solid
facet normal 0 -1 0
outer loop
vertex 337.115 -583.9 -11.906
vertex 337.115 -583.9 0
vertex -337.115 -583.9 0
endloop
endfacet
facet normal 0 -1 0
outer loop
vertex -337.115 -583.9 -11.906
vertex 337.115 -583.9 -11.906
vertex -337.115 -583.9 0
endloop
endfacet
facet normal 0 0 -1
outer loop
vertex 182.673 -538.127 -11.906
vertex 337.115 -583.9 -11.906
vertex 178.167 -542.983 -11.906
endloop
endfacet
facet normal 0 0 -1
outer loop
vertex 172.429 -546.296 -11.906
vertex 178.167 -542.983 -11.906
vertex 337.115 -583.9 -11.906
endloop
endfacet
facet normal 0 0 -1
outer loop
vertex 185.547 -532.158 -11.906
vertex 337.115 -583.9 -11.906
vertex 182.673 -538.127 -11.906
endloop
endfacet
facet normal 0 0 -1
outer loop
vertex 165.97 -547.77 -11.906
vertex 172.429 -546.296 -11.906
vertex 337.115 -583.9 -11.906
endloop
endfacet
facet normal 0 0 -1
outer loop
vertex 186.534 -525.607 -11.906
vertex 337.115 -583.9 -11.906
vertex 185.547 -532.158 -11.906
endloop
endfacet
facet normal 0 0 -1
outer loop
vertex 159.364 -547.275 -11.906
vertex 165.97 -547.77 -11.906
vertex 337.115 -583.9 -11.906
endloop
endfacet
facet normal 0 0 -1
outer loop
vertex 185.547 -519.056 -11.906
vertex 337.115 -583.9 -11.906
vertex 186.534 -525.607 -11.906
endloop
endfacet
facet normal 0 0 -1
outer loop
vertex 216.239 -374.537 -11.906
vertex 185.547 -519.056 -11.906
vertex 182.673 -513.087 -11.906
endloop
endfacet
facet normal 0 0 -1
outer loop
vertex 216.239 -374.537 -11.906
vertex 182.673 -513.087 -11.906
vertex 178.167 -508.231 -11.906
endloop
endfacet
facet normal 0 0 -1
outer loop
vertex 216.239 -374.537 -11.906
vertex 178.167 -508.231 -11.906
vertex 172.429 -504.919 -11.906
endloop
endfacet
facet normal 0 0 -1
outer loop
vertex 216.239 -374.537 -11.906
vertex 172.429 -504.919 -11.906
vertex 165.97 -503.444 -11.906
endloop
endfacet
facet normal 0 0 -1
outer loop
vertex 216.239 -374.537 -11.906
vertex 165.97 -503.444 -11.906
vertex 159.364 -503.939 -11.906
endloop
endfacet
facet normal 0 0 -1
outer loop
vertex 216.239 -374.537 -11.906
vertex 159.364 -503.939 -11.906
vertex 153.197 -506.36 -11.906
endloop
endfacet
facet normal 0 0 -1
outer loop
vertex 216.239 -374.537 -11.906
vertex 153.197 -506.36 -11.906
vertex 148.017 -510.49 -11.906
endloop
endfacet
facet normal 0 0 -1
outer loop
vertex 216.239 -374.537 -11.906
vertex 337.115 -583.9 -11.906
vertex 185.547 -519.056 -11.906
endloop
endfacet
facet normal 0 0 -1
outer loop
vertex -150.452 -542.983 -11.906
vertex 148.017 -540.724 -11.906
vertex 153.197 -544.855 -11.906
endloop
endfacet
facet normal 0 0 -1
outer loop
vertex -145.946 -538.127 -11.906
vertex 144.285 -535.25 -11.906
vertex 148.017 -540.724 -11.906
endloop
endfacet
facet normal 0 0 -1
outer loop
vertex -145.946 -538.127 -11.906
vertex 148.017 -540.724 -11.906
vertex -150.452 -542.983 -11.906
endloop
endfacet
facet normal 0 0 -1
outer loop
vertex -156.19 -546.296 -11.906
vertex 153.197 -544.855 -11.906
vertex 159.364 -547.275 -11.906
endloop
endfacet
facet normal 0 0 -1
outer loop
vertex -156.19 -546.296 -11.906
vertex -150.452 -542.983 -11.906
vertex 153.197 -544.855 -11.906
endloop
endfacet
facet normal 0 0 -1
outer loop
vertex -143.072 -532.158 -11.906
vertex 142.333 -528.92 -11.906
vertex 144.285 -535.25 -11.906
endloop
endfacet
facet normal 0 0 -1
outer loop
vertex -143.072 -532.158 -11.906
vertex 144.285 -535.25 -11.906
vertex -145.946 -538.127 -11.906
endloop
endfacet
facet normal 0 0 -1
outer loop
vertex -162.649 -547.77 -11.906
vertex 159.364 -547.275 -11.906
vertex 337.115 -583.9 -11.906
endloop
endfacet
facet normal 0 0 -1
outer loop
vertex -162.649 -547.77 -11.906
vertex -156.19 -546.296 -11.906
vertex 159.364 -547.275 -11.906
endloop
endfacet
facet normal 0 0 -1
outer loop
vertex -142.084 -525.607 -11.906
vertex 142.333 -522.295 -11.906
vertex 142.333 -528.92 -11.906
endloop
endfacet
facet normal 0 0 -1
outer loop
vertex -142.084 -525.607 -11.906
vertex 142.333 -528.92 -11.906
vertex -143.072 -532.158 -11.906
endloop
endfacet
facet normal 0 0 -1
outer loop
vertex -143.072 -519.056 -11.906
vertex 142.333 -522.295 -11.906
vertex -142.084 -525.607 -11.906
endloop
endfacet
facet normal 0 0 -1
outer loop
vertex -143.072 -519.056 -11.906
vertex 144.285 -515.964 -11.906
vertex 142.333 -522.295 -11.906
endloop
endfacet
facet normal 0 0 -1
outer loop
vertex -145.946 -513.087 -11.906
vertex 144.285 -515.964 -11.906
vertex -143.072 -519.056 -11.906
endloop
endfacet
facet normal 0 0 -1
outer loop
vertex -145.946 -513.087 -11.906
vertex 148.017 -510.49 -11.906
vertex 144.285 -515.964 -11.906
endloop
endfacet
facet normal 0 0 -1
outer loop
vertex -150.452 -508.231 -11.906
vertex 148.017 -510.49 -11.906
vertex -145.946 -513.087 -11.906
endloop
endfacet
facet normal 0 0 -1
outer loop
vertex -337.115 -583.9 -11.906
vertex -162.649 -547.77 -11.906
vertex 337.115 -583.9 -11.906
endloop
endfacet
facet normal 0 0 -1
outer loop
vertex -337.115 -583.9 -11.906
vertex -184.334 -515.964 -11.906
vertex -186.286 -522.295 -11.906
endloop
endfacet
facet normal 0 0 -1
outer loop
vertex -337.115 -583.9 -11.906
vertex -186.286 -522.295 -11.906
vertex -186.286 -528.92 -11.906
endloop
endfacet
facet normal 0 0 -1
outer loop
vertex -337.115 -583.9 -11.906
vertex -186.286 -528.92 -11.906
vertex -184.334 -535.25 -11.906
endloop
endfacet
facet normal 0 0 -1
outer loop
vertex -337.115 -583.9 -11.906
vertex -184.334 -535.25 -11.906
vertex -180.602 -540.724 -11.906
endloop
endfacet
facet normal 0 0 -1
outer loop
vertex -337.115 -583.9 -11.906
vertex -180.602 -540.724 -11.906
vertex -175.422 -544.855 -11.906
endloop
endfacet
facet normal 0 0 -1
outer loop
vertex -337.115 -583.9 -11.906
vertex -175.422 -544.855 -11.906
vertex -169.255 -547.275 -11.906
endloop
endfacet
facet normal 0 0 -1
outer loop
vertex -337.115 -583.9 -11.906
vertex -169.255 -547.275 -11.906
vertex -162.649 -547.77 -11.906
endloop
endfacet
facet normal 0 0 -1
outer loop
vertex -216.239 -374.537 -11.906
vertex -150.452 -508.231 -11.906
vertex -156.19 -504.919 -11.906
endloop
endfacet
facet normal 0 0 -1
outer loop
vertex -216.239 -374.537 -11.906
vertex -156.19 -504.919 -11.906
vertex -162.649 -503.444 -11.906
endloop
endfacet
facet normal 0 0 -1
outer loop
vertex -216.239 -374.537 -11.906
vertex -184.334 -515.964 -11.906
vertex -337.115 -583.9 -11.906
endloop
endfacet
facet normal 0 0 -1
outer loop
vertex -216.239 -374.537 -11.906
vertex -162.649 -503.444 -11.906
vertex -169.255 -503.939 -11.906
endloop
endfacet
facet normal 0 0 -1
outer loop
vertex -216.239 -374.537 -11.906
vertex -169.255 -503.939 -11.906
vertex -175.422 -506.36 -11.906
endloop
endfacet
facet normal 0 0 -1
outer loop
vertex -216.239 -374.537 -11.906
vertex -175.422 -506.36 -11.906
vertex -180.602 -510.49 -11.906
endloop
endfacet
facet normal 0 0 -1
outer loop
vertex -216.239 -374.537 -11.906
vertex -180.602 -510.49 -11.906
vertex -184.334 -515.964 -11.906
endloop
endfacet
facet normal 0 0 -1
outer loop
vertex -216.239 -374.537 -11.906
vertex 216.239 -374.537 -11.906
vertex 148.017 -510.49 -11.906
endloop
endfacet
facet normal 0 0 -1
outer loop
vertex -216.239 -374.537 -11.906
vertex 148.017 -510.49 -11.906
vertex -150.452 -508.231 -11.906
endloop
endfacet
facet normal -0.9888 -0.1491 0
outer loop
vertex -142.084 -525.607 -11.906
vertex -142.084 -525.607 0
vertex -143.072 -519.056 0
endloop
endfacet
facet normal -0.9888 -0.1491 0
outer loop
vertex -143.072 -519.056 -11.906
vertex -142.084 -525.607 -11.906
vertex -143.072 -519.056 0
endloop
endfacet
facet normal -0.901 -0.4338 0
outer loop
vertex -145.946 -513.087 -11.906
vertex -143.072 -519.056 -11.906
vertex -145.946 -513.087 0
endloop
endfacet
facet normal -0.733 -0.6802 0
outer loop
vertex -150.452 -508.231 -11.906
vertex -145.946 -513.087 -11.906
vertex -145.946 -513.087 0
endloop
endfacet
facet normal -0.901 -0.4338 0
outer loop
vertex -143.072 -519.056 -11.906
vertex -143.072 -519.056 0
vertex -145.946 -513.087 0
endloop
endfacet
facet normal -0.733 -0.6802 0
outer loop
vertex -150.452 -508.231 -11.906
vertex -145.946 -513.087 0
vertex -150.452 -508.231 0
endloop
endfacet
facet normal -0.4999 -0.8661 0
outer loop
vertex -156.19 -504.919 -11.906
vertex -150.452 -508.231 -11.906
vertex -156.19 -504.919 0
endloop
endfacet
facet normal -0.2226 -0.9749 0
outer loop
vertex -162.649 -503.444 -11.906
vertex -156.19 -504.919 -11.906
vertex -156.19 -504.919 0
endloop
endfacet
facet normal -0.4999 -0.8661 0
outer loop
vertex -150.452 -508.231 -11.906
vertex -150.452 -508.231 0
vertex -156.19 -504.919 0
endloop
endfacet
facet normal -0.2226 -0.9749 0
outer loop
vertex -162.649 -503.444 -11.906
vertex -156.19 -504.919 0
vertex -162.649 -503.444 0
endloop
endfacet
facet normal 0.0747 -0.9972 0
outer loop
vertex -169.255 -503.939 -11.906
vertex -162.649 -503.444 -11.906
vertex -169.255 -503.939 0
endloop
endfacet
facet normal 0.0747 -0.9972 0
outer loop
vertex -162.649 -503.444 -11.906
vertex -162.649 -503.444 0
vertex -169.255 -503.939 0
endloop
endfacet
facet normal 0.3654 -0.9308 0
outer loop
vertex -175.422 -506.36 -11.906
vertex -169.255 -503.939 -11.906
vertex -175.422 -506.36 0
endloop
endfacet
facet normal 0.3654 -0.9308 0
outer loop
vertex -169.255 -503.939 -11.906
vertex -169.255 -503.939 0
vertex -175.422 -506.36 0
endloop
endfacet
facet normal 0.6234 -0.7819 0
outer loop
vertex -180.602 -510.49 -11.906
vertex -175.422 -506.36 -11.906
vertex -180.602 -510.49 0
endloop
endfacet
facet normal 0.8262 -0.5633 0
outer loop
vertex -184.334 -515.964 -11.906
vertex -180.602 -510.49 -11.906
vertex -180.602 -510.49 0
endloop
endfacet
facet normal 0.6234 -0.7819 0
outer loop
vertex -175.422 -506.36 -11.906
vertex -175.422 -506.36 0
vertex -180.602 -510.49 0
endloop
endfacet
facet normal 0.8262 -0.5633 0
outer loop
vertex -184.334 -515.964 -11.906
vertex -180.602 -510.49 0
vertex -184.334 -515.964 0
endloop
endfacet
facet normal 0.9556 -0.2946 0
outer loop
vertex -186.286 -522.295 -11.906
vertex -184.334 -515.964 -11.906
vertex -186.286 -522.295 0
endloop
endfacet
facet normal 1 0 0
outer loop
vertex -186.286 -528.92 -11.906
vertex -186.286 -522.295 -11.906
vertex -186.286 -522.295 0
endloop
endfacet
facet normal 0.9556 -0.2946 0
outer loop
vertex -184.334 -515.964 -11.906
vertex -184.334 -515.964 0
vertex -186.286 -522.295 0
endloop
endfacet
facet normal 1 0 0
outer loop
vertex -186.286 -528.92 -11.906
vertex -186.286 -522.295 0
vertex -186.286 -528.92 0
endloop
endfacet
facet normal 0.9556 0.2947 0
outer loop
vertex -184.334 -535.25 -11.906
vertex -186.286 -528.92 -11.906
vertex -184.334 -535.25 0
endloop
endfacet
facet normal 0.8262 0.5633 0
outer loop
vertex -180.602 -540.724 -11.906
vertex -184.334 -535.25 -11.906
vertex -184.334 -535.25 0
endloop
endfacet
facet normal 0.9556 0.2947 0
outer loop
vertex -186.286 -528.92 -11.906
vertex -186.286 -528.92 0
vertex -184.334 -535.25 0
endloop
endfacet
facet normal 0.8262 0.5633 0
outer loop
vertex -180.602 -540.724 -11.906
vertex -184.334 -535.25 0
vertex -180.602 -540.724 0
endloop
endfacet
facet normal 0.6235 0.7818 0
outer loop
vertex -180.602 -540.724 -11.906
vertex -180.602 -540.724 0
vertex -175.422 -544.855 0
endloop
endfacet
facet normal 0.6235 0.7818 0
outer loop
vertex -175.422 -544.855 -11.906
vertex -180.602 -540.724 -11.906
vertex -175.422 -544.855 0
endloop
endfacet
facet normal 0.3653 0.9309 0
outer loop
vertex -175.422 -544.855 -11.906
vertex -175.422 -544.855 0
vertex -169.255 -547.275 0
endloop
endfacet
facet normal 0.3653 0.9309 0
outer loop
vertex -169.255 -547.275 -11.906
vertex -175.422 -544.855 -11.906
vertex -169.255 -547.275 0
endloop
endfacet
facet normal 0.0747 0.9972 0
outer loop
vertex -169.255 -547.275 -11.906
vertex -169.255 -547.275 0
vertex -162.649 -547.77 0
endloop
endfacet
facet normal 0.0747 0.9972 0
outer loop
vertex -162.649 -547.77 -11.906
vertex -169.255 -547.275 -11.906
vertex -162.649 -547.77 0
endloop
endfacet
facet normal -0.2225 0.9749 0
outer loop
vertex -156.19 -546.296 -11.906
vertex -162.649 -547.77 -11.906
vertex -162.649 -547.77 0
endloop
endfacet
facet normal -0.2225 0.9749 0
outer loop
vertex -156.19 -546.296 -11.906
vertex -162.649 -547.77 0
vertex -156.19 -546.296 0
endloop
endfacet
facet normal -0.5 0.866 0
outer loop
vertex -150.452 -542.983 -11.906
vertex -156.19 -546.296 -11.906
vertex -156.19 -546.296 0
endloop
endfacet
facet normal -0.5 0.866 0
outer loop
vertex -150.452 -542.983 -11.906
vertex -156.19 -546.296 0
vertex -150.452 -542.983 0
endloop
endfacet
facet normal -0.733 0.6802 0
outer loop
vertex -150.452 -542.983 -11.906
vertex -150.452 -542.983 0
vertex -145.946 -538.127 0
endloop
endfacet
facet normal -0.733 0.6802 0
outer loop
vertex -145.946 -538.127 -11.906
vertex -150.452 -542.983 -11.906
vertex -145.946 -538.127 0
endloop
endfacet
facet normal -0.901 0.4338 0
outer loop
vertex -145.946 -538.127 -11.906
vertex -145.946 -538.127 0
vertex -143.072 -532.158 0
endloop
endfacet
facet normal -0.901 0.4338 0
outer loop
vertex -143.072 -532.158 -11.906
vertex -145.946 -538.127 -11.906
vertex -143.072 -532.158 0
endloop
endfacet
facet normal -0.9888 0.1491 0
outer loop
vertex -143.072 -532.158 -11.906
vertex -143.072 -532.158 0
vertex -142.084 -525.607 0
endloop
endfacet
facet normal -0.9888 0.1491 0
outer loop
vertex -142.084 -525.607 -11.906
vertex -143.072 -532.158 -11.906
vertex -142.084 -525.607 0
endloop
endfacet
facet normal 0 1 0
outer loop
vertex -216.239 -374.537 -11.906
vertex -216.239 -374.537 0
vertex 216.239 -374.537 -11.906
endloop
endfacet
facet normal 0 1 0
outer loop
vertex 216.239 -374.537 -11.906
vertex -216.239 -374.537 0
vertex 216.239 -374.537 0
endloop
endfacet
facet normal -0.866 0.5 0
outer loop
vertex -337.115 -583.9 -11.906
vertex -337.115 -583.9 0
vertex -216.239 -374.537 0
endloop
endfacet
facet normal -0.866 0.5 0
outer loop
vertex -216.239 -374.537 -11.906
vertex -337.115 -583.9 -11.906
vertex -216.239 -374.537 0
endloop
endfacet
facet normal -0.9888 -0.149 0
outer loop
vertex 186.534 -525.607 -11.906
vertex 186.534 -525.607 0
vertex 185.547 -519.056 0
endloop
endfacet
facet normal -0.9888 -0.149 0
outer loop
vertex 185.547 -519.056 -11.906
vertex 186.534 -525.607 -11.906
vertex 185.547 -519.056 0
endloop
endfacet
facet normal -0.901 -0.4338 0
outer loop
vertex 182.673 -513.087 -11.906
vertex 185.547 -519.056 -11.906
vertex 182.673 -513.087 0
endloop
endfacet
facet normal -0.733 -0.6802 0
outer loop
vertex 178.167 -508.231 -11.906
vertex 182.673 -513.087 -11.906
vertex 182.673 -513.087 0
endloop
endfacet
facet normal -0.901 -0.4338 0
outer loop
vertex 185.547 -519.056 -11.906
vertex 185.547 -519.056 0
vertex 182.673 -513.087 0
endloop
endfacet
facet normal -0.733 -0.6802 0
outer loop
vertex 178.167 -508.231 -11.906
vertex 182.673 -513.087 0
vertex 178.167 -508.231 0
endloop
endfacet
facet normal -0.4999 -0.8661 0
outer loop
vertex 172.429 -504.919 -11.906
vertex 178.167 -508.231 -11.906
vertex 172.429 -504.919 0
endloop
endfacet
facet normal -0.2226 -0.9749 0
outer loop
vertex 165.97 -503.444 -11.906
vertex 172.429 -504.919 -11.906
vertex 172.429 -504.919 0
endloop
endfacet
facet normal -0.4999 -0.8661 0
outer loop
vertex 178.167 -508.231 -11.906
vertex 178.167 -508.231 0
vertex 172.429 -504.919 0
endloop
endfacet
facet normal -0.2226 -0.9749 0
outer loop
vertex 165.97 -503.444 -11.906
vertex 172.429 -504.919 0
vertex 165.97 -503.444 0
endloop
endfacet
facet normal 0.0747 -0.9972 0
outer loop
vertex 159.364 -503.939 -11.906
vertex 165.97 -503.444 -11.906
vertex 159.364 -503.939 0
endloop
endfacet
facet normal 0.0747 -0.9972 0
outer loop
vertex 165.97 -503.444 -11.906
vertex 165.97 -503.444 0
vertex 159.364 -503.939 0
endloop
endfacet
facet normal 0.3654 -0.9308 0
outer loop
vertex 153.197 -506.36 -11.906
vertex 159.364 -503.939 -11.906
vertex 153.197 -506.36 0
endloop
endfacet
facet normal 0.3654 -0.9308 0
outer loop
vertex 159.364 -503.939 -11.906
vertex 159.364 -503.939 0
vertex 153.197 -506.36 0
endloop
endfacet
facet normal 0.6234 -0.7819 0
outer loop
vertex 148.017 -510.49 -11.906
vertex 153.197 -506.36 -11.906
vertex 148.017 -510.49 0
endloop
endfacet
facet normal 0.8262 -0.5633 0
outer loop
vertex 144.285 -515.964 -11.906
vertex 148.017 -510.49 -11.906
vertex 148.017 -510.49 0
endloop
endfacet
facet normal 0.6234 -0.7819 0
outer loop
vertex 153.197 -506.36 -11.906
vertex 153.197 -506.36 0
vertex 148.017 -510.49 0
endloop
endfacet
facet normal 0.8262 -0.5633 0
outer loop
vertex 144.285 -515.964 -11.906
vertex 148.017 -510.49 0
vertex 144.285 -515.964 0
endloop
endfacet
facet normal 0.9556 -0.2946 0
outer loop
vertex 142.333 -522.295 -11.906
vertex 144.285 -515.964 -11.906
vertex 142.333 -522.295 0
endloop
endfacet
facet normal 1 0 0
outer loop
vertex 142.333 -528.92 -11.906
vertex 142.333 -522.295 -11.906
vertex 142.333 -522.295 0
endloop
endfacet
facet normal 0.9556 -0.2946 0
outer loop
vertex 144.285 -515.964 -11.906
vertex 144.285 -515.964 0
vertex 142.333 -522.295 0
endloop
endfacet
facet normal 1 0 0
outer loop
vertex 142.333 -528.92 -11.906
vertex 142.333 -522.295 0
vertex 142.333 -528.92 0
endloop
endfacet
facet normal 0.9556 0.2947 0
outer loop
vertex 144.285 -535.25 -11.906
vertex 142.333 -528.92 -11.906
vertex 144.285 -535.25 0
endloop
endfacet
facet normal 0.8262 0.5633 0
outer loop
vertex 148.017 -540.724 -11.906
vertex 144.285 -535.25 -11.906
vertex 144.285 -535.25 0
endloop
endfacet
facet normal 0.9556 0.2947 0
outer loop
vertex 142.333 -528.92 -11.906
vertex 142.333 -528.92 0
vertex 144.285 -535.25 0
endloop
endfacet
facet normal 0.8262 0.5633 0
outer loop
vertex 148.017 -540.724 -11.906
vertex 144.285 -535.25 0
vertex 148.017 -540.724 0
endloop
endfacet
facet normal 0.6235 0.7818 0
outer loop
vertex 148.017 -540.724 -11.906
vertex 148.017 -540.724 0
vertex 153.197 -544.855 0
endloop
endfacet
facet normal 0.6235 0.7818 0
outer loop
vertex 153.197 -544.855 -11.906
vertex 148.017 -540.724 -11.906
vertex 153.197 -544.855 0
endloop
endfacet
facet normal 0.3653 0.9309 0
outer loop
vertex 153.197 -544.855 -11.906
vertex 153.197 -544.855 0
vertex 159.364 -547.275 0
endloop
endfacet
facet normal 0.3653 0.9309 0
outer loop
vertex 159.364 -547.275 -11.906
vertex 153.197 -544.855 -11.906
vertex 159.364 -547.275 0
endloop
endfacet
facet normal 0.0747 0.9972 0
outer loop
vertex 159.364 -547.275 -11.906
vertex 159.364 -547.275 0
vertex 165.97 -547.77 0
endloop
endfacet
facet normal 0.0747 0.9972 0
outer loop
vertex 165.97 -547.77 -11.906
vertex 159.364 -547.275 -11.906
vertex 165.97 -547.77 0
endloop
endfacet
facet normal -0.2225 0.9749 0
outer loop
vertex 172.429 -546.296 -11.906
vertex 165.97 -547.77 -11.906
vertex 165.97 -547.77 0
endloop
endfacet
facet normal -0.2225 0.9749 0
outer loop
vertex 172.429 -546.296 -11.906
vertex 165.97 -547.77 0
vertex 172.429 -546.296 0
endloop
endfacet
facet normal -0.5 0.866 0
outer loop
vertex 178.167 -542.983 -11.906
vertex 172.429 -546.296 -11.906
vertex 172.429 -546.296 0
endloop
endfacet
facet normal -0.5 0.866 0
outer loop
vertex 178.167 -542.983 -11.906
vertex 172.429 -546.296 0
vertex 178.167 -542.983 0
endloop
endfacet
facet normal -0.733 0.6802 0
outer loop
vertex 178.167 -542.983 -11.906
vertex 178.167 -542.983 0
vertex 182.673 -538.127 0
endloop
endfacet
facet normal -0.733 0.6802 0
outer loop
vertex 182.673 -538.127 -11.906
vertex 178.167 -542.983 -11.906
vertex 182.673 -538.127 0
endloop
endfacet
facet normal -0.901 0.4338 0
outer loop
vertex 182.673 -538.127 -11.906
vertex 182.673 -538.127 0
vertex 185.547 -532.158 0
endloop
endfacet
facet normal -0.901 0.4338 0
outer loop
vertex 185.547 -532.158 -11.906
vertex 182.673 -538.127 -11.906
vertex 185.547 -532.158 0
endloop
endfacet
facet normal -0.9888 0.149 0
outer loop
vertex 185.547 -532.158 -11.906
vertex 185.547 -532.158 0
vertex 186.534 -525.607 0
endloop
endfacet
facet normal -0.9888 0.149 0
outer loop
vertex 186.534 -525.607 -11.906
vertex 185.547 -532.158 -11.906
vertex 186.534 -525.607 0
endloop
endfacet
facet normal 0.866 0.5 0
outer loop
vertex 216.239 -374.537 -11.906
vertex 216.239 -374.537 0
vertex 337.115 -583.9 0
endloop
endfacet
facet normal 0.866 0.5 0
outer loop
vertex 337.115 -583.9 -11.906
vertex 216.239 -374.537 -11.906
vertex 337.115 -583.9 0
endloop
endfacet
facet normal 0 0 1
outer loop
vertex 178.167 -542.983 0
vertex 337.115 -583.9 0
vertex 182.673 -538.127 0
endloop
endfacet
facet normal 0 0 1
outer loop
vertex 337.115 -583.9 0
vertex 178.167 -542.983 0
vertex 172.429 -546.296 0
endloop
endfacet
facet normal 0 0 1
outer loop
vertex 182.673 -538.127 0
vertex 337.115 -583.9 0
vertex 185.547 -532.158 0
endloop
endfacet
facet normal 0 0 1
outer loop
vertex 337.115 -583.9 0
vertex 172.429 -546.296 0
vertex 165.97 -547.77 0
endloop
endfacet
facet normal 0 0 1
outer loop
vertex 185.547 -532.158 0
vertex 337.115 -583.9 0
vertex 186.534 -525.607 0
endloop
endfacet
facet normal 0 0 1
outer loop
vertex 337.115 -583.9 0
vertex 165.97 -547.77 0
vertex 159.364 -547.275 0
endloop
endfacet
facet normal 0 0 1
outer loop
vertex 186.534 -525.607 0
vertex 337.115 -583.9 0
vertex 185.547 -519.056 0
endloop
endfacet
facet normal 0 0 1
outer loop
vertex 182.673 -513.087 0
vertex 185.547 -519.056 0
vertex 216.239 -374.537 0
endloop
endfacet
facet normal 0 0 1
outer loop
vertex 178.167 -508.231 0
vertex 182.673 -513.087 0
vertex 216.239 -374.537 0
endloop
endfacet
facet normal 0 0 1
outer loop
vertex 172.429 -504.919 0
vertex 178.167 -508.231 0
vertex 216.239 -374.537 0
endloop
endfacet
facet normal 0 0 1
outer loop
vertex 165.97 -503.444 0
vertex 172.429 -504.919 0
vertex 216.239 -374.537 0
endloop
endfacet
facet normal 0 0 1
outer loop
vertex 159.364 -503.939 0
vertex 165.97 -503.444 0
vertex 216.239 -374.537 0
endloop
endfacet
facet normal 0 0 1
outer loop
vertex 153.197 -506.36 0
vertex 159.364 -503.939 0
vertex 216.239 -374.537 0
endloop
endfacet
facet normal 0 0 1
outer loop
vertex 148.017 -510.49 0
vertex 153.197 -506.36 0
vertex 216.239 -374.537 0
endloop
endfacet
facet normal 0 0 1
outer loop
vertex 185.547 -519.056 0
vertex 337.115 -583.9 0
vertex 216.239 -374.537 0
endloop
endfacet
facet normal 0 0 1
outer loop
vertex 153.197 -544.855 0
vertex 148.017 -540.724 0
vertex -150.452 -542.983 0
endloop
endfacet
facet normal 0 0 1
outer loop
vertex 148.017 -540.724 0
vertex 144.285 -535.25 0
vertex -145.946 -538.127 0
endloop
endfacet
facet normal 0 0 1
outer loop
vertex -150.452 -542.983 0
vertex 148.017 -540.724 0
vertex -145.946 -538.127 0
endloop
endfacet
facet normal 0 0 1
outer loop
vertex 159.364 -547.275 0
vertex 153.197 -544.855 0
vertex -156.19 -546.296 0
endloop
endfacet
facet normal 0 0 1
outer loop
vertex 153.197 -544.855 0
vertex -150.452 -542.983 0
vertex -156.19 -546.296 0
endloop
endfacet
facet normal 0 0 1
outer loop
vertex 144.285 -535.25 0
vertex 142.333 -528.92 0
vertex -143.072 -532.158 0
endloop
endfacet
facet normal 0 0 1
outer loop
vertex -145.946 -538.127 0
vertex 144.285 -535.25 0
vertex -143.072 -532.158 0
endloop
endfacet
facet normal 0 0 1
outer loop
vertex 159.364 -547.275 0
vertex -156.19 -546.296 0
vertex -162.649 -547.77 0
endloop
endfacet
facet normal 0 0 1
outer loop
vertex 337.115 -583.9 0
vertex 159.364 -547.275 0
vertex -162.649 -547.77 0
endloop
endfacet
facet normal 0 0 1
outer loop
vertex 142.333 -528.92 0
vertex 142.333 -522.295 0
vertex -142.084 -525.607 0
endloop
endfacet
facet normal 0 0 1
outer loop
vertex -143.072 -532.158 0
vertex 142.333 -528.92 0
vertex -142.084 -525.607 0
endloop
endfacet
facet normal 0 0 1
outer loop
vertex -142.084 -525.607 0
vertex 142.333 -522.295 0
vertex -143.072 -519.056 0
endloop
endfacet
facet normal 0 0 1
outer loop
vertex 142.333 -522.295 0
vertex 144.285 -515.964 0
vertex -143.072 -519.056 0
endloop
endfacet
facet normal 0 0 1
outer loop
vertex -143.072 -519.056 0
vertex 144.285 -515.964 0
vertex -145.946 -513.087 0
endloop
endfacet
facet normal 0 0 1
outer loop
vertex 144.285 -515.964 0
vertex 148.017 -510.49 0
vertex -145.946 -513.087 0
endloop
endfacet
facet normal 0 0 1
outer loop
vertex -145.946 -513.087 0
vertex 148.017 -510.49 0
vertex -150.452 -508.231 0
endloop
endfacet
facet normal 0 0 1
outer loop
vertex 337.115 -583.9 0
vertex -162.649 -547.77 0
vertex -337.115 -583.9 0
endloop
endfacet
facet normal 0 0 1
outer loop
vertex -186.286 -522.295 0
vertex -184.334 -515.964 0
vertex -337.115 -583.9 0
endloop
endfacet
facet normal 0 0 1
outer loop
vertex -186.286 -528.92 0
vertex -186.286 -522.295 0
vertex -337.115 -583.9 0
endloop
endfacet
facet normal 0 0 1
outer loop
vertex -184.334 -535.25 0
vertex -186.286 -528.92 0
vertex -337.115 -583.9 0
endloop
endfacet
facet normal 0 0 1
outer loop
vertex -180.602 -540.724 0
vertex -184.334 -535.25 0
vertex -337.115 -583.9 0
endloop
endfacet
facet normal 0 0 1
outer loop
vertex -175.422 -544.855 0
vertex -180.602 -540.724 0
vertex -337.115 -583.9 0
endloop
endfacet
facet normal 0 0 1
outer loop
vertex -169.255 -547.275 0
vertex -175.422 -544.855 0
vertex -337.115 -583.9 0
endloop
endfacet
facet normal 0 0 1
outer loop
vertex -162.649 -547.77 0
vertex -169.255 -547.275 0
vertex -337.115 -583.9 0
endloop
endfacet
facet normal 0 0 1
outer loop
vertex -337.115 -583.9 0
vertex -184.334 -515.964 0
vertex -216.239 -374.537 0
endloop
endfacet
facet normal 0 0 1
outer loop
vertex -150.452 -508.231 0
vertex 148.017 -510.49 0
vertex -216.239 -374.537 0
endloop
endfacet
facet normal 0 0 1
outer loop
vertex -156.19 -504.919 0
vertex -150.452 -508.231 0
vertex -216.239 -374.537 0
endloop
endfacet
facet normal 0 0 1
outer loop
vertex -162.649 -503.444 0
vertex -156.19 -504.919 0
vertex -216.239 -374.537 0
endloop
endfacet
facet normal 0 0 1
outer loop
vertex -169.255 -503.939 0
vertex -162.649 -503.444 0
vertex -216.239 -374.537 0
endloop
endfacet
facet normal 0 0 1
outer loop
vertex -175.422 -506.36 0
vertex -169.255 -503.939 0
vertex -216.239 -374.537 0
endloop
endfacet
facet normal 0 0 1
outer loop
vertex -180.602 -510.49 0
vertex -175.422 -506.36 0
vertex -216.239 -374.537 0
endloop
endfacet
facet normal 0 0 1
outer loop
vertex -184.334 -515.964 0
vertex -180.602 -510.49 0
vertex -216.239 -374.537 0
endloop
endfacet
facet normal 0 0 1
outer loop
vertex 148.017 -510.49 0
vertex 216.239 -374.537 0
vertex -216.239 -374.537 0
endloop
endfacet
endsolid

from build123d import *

# Parameters (mm, degrees)
BOSS_EXTRUDE1_DEPTH = 11.90625
SKETCH2_R           = 22.225
CUT_EXTRUDE1_DEPTH  = 12.90625


with BuildPart() as part:
    # Sketch1 → Boss-Extrude1 (new body)
    with BuildSketch(Plane.XY):
        Polygon((-337.114930678, -583.900187925), (-216.238948081, -374.536844651), (216.238948081, -374.536844651), (337.114930678, -583.900187925), align=None)
    extrude(amount=-BOSS_EXTRUDE1_DEPTH)

    # Sketch2 → Cut-Extrude1 (cut, through all)
    with BuildSketch(Plane.XY):
        with Locations((-164.309496882, -525.607187925)):
            Circle(SKETCH2_R)
        with Locations((164.309496882, -525.607187925)):
            Circle(SKETCH2_R)
    extrude(amount=-CUT_EXTRUDE1_DEPTH, mode=Mode.SUBTRACT)


solid = part.part
